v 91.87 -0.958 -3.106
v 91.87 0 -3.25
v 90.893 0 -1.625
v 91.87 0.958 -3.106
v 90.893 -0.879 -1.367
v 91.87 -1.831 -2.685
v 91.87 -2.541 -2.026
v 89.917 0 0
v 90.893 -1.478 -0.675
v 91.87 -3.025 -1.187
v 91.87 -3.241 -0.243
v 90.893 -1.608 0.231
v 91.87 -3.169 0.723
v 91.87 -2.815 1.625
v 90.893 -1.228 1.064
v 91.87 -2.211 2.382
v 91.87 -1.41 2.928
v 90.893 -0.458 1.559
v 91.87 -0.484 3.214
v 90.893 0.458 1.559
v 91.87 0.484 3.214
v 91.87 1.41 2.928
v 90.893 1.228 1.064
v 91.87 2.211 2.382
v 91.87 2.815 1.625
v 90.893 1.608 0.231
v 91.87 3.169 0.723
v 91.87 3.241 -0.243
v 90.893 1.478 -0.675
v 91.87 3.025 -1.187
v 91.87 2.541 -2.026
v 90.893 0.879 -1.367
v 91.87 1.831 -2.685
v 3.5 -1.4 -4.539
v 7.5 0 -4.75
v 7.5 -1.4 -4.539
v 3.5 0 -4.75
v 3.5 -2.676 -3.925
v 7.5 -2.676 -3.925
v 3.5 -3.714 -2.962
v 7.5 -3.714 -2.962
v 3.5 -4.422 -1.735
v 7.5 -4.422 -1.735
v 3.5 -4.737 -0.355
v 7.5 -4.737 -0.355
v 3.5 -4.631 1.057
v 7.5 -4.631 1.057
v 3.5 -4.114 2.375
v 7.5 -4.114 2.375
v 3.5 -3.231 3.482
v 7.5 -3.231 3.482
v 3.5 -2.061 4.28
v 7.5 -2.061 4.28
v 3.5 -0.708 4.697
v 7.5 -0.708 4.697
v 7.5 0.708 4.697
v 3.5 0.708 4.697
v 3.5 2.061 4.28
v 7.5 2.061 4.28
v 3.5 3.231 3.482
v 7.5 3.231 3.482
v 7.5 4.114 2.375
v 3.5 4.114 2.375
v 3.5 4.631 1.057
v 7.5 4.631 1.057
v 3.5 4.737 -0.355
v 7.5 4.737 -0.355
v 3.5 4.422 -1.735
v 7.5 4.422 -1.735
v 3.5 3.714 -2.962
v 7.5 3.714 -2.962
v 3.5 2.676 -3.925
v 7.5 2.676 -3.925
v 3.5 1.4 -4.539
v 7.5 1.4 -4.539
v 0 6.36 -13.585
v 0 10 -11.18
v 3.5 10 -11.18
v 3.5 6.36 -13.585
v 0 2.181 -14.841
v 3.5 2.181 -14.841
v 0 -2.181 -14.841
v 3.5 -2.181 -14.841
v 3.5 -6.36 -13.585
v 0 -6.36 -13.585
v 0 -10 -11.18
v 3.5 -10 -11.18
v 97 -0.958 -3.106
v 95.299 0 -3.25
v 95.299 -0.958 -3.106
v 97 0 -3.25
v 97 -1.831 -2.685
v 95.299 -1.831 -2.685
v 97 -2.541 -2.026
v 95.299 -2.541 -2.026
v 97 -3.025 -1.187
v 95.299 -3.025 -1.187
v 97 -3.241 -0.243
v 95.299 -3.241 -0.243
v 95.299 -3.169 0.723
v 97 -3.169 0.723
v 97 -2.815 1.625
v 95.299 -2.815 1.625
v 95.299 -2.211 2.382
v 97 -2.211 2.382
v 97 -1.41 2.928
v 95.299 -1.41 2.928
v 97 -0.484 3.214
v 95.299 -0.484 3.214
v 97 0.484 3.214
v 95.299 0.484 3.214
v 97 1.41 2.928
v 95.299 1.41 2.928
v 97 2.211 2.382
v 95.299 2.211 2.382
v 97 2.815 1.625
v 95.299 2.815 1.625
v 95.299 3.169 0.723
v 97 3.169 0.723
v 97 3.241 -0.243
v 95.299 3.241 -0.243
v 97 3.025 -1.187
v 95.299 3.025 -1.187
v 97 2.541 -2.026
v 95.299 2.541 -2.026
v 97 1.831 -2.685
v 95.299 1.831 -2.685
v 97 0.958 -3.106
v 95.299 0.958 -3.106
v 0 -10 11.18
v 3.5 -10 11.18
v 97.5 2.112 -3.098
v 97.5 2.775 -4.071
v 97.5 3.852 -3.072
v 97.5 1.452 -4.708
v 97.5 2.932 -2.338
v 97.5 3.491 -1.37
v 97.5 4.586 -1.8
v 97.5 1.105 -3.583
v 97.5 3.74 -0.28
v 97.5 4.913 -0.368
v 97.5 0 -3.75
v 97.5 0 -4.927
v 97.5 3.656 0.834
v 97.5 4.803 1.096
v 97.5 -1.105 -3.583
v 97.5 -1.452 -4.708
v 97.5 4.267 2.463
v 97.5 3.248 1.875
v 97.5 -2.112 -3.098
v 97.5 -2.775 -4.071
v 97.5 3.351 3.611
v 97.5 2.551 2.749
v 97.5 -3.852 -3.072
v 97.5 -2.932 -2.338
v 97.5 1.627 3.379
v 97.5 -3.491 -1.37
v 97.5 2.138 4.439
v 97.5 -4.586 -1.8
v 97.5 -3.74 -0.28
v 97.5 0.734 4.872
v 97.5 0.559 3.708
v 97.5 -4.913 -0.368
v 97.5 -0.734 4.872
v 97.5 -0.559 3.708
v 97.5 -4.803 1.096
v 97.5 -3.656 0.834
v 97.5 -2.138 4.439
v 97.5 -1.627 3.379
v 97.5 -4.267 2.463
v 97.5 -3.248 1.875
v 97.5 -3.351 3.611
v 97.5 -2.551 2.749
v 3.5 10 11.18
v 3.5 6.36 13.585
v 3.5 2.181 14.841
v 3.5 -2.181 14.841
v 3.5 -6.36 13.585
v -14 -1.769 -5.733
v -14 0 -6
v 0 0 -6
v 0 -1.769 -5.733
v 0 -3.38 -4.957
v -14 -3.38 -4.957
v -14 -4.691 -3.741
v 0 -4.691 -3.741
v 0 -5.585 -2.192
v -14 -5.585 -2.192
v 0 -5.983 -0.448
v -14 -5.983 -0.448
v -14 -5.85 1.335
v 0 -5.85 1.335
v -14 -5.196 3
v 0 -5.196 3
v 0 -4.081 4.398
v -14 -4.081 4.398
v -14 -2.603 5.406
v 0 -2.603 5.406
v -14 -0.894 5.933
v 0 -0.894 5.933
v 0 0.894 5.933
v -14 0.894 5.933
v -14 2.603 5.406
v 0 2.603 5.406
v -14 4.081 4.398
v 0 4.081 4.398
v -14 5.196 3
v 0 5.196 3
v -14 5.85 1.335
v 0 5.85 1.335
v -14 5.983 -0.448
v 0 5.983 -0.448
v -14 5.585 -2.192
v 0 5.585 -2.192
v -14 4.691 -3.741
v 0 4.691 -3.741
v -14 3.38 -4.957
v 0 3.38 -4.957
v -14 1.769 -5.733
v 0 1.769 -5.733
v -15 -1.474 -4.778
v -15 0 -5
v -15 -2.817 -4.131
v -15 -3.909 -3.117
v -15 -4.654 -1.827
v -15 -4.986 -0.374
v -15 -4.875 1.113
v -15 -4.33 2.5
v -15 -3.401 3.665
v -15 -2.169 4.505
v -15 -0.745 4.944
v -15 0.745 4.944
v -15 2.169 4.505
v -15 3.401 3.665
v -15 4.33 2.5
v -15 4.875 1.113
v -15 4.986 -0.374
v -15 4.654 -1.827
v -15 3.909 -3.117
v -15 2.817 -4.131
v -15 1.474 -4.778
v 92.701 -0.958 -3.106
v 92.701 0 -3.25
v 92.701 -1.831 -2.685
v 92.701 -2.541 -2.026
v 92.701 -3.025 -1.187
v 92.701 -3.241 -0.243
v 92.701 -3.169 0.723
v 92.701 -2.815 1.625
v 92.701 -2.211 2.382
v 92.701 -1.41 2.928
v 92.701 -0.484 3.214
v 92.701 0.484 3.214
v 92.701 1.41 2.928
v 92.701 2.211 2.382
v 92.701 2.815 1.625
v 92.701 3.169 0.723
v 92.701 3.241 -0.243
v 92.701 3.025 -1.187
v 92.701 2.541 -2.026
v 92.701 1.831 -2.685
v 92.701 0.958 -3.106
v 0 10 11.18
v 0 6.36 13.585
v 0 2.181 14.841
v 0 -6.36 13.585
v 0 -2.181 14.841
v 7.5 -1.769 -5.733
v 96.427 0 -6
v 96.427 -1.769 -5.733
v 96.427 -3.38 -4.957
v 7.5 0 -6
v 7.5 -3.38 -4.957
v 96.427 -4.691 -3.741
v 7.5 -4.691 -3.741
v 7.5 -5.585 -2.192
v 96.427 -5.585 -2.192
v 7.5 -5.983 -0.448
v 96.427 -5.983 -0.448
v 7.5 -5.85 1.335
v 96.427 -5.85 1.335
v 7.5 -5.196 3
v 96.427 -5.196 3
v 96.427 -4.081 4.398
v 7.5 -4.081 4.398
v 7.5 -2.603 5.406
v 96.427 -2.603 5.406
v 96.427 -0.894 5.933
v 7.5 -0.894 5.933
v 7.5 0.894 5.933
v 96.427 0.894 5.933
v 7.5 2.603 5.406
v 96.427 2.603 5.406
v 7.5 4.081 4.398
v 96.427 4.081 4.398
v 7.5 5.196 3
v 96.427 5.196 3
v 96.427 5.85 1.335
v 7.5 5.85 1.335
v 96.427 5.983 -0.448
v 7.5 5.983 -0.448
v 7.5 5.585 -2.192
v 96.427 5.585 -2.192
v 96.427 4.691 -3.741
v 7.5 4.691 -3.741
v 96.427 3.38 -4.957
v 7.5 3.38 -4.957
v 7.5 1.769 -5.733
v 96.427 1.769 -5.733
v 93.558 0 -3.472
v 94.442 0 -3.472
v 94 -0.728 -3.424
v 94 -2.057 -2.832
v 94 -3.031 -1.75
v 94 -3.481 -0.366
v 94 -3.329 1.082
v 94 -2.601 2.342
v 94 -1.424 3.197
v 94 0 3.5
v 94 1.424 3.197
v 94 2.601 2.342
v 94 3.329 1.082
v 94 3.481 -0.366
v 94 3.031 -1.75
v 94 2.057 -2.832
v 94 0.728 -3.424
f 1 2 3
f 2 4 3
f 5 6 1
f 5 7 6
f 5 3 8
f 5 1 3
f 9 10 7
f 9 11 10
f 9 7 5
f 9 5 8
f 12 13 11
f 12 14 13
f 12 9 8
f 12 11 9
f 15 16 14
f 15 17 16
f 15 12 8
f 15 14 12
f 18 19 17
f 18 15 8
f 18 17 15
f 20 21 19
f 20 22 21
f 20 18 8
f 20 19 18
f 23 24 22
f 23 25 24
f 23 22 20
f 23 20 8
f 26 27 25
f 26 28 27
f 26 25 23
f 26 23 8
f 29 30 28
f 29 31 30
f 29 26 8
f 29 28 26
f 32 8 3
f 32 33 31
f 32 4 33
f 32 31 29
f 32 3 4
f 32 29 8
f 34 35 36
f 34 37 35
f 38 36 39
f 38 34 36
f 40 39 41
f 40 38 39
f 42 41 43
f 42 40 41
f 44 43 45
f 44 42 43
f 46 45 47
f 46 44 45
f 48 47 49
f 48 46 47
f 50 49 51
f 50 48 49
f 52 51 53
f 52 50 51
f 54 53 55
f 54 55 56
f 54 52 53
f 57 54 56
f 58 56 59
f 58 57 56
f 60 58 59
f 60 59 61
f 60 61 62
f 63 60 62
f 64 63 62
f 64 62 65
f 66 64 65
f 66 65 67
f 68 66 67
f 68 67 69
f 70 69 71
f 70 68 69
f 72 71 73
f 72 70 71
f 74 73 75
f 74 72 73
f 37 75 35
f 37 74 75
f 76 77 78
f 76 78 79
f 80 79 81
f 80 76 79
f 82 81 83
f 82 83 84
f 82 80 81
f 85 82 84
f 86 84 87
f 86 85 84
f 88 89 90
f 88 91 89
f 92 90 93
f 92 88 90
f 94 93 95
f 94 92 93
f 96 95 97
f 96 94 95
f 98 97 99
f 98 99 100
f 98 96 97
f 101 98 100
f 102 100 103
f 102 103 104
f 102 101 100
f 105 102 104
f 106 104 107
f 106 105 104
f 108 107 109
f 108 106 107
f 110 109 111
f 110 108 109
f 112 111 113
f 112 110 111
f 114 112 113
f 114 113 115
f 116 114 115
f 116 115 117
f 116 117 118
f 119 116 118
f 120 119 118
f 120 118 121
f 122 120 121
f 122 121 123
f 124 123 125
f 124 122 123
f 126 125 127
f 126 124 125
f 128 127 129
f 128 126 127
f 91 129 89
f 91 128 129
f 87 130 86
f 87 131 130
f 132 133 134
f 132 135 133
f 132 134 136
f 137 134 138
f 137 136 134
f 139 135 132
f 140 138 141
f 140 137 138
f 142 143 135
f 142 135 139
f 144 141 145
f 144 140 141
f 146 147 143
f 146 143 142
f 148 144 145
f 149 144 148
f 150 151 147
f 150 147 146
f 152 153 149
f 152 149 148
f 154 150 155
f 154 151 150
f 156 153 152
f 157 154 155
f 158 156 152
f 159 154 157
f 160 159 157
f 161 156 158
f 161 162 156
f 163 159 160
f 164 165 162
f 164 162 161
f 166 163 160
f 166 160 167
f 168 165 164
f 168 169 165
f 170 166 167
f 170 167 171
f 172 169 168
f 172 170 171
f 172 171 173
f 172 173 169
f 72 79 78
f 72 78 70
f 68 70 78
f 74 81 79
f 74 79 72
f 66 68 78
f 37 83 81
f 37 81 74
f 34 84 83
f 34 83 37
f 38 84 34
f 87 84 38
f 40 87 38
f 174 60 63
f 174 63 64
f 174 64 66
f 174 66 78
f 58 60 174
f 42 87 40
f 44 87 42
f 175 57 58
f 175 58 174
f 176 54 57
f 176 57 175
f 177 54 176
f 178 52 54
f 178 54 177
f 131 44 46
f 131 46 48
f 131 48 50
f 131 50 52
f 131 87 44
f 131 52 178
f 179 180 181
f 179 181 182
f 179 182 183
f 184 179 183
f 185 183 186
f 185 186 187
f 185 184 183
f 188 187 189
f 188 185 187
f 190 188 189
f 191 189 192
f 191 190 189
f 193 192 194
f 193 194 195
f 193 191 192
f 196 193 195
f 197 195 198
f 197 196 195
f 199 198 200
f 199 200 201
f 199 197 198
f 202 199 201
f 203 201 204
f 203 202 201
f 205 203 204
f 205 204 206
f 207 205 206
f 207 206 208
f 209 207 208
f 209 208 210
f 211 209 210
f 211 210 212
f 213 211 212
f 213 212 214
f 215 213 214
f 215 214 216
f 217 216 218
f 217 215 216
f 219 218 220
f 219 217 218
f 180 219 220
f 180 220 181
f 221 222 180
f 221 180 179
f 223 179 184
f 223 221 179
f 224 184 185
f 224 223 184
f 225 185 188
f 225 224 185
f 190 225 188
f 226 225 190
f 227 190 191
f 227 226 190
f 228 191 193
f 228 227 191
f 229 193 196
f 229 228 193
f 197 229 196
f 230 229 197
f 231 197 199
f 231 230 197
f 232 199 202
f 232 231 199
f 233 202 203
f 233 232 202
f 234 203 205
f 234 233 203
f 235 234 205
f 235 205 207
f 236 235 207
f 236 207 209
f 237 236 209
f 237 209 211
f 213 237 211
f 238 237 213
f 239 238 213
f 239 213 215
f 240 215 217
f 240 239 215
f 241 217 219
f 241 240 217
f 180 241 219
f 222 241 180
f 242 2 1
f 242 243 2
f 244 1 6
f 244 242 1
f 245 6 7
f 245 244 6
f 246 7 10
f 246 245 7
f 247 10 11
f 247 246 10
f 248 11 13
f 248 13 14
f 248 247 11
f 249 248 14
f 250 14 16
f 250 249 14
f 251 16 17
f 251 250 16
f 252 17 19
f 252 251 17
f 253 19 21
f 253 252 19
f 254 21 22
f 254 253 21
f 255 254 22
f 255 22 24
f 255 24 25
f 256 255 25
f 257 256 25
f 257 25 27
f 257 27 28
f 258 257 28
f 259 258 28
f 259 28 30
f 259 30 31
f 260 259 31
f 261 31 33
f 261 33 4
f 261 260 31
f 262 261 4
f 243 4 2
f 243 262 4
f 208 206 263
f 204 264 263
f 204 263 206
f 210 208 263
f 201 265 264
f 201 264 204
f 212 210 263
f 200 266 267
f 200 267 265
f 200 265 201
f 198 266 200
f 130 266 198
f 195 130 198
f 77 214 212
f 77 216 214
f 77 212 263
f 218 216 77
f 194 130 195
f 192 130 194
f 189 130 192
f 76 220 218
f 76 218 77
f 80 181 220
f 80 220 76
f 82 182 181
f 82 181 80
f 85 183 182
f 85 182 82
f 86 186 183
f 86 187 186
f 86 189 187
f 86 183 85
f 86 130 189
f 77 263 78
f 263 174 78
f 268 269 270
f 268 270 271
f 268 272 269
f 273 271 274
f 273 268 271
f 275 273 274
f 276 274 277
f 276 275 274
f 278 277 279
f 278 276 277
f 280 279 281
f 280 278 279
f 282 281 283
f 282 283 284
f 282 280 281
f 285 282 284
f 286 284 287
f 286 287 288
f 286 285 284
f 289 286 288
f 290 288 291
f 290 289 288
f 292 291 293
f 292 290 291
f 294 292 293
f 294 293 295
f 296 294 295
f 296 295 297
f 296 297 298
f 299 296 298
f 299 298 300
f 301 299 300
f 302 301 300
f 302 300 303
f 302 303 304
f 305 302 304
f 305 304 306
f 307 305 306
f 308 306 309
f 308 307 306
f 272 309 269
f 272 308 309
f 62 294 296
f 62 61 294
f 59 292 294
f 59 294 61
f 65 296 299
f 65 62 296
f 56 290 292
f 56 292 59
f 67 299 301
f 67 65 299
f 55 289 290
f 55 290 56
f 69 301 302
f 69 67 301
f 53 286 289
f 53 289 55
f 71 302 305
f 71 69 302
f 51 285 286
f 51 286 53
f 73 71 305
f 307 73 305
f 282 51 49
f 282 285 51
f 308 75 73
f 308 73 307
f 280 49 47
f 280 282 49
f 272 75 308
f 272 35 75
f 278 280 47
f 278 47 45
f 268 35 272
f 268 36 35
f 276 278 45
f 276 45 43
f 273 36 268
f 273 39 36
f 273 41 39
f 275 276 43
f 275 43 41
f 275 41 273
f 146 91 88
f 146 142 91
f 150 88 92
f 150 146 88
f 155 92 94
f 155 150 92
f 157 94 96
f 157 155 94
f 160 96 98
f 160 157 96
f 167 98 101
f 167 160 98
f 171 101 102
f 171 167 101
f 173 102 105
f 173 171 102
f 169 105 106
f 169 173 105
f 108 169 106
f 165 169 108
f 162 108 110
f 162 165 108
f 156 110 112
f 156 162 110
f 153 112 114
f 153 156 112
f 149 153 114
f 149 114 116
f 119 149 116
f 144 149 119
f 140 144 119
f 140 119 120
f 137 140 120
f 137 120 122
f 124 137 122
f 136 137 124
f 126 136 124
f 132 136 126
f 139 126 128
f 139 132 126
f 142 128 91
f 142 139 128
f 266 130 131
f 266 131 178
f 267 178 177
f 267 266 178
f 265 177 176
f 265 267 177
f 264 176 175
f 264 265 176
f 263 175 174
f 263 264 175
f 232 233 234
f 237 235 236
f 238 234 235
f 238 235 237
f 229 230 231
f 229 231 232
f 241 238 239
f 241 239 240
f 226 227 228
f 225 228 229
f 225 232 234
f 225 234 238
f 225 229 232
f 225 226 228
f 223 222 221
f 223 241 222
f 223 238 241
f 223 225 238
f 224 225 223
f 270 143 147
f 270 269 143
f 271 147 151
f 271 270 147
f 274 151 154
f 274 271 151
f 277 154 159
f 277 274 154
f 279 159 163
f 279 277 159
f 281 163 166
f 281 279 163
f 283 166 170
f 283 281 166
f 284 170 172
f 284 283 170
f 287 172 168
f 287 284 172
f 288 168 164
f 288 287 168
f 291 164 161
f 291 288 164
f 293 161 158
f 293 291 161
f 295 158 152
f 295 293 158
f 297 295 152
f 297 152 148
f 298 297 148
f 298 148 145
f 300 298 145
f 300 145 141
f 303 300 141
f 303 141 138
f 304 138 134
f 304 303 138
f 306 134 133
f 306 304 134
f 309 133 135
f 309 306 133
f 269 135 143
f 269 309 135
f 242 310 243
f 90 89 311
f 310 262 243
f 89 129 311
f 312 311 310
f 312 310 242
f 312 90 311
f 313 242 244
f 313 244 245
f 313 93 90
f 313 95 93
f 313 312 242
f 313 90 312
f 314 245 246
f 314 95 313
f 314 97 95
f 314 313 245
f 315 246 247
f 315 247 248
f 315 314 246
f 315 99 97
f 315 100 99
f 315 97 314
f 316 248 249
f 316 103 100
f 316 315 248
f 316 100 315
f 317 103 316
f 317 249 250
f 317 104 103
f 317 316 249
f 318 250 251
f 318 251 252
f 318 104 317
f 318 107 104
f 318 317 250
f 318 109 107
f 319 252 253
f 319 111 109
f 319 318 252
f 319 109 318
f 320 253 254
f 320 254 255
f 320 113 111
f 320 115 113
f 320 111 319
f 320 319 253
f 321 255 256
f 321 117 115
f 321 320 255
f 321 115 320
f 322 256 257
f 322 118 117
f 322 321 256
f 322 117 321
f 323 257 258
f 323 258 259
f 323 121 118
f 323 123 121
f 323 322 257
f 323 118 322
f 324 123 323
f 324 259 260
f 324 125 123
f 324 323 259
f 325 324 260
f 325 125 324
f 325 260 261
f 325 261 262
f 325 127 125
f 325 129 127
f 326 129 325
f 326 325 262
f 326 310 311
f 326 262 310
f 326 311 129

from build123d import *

# Parameters (mm, degrees)
CHANFREIN2_SIZE = 1
M_PLATS_DEPTH   = 97.363893653


with BuildPart() as part:
    # Esquisse1 → Forme de révolution (revolve)
    with BuildSketch(Plane.XY, mode=Mode.PRIVATE) as forme_de_r_volution_sk:
        with BuildLine():
            Line((-15, 0), (89.91678311, 0))
            Line((89.91678311, 0), (91.869580122, 3.25))
            Line((91.869580122, 3.25), (92.700961894, 3.25))
            ThreePointArc((92.700961894, 3.25), (94, 3.5), (95.299038106, 3.25))
            Line((95.299038106, 3.25), (97, 3.25))
            Line((97, 3.25), (97.5, 3.75))
            Line((97.5, 3.75), (97.5, 4.92655))
            Line((97.5, 4.92655), (96.42655, 6))
            Line((96.42655, 6), (7.5, 6))
            Line((7.5, 6), (7.5, 4.75))
            Line((7.5, 4.75), (3.5, 4.75))
            Line((3.5, 4.75), (3.5, 15))
            Line((3.5, 15), (0, 15))
            Line((0, 15), (0, 6))
            Line((0, 6), (-15, 6))
            Line((-15, 6), (-15, 0))
        make_face()
    revolve(forme_de_r_volution_sk.sketch.rotate(Axis((110.666531714, 0, 0), (-1, 0, 0)), 90), axis=Axis((110.666531714, 0, 0), (-1, 0, 0)))

    # Chanfrein2
    chanfrein2_edges = [part.edges().sort_by_distance(p)[0] for p in [
        (-15, 0, 6),
    ]]
    chamfer(chanfrein2_edges, length=CHANFREIN2_SIZE)

    # Esquisse3 → Méplats (cut, symmetric)
    with BuildSketch(Plane(origin=(3.5, 0, 0), x_dir=(0, 0, -1), z_dir=(1, 0, 0))):
        Polygon((-103.669154566, 10), (-15.223201291, 10), (13.534968643, 10), (101.980921918, 10), (101.980921918, 186.891906549), (-103.669154566, 186.891906549), align=None)
    m_plats = extrude(amount=M_PLATS_DEPTH, both=True, mode=Mode.SUBTRACT)

    # Symétrie1: Méplats across plane
    add(m_plats.mirror(Plane.ZX), mode=Mode.SUBTRACT)


solid = part.part
